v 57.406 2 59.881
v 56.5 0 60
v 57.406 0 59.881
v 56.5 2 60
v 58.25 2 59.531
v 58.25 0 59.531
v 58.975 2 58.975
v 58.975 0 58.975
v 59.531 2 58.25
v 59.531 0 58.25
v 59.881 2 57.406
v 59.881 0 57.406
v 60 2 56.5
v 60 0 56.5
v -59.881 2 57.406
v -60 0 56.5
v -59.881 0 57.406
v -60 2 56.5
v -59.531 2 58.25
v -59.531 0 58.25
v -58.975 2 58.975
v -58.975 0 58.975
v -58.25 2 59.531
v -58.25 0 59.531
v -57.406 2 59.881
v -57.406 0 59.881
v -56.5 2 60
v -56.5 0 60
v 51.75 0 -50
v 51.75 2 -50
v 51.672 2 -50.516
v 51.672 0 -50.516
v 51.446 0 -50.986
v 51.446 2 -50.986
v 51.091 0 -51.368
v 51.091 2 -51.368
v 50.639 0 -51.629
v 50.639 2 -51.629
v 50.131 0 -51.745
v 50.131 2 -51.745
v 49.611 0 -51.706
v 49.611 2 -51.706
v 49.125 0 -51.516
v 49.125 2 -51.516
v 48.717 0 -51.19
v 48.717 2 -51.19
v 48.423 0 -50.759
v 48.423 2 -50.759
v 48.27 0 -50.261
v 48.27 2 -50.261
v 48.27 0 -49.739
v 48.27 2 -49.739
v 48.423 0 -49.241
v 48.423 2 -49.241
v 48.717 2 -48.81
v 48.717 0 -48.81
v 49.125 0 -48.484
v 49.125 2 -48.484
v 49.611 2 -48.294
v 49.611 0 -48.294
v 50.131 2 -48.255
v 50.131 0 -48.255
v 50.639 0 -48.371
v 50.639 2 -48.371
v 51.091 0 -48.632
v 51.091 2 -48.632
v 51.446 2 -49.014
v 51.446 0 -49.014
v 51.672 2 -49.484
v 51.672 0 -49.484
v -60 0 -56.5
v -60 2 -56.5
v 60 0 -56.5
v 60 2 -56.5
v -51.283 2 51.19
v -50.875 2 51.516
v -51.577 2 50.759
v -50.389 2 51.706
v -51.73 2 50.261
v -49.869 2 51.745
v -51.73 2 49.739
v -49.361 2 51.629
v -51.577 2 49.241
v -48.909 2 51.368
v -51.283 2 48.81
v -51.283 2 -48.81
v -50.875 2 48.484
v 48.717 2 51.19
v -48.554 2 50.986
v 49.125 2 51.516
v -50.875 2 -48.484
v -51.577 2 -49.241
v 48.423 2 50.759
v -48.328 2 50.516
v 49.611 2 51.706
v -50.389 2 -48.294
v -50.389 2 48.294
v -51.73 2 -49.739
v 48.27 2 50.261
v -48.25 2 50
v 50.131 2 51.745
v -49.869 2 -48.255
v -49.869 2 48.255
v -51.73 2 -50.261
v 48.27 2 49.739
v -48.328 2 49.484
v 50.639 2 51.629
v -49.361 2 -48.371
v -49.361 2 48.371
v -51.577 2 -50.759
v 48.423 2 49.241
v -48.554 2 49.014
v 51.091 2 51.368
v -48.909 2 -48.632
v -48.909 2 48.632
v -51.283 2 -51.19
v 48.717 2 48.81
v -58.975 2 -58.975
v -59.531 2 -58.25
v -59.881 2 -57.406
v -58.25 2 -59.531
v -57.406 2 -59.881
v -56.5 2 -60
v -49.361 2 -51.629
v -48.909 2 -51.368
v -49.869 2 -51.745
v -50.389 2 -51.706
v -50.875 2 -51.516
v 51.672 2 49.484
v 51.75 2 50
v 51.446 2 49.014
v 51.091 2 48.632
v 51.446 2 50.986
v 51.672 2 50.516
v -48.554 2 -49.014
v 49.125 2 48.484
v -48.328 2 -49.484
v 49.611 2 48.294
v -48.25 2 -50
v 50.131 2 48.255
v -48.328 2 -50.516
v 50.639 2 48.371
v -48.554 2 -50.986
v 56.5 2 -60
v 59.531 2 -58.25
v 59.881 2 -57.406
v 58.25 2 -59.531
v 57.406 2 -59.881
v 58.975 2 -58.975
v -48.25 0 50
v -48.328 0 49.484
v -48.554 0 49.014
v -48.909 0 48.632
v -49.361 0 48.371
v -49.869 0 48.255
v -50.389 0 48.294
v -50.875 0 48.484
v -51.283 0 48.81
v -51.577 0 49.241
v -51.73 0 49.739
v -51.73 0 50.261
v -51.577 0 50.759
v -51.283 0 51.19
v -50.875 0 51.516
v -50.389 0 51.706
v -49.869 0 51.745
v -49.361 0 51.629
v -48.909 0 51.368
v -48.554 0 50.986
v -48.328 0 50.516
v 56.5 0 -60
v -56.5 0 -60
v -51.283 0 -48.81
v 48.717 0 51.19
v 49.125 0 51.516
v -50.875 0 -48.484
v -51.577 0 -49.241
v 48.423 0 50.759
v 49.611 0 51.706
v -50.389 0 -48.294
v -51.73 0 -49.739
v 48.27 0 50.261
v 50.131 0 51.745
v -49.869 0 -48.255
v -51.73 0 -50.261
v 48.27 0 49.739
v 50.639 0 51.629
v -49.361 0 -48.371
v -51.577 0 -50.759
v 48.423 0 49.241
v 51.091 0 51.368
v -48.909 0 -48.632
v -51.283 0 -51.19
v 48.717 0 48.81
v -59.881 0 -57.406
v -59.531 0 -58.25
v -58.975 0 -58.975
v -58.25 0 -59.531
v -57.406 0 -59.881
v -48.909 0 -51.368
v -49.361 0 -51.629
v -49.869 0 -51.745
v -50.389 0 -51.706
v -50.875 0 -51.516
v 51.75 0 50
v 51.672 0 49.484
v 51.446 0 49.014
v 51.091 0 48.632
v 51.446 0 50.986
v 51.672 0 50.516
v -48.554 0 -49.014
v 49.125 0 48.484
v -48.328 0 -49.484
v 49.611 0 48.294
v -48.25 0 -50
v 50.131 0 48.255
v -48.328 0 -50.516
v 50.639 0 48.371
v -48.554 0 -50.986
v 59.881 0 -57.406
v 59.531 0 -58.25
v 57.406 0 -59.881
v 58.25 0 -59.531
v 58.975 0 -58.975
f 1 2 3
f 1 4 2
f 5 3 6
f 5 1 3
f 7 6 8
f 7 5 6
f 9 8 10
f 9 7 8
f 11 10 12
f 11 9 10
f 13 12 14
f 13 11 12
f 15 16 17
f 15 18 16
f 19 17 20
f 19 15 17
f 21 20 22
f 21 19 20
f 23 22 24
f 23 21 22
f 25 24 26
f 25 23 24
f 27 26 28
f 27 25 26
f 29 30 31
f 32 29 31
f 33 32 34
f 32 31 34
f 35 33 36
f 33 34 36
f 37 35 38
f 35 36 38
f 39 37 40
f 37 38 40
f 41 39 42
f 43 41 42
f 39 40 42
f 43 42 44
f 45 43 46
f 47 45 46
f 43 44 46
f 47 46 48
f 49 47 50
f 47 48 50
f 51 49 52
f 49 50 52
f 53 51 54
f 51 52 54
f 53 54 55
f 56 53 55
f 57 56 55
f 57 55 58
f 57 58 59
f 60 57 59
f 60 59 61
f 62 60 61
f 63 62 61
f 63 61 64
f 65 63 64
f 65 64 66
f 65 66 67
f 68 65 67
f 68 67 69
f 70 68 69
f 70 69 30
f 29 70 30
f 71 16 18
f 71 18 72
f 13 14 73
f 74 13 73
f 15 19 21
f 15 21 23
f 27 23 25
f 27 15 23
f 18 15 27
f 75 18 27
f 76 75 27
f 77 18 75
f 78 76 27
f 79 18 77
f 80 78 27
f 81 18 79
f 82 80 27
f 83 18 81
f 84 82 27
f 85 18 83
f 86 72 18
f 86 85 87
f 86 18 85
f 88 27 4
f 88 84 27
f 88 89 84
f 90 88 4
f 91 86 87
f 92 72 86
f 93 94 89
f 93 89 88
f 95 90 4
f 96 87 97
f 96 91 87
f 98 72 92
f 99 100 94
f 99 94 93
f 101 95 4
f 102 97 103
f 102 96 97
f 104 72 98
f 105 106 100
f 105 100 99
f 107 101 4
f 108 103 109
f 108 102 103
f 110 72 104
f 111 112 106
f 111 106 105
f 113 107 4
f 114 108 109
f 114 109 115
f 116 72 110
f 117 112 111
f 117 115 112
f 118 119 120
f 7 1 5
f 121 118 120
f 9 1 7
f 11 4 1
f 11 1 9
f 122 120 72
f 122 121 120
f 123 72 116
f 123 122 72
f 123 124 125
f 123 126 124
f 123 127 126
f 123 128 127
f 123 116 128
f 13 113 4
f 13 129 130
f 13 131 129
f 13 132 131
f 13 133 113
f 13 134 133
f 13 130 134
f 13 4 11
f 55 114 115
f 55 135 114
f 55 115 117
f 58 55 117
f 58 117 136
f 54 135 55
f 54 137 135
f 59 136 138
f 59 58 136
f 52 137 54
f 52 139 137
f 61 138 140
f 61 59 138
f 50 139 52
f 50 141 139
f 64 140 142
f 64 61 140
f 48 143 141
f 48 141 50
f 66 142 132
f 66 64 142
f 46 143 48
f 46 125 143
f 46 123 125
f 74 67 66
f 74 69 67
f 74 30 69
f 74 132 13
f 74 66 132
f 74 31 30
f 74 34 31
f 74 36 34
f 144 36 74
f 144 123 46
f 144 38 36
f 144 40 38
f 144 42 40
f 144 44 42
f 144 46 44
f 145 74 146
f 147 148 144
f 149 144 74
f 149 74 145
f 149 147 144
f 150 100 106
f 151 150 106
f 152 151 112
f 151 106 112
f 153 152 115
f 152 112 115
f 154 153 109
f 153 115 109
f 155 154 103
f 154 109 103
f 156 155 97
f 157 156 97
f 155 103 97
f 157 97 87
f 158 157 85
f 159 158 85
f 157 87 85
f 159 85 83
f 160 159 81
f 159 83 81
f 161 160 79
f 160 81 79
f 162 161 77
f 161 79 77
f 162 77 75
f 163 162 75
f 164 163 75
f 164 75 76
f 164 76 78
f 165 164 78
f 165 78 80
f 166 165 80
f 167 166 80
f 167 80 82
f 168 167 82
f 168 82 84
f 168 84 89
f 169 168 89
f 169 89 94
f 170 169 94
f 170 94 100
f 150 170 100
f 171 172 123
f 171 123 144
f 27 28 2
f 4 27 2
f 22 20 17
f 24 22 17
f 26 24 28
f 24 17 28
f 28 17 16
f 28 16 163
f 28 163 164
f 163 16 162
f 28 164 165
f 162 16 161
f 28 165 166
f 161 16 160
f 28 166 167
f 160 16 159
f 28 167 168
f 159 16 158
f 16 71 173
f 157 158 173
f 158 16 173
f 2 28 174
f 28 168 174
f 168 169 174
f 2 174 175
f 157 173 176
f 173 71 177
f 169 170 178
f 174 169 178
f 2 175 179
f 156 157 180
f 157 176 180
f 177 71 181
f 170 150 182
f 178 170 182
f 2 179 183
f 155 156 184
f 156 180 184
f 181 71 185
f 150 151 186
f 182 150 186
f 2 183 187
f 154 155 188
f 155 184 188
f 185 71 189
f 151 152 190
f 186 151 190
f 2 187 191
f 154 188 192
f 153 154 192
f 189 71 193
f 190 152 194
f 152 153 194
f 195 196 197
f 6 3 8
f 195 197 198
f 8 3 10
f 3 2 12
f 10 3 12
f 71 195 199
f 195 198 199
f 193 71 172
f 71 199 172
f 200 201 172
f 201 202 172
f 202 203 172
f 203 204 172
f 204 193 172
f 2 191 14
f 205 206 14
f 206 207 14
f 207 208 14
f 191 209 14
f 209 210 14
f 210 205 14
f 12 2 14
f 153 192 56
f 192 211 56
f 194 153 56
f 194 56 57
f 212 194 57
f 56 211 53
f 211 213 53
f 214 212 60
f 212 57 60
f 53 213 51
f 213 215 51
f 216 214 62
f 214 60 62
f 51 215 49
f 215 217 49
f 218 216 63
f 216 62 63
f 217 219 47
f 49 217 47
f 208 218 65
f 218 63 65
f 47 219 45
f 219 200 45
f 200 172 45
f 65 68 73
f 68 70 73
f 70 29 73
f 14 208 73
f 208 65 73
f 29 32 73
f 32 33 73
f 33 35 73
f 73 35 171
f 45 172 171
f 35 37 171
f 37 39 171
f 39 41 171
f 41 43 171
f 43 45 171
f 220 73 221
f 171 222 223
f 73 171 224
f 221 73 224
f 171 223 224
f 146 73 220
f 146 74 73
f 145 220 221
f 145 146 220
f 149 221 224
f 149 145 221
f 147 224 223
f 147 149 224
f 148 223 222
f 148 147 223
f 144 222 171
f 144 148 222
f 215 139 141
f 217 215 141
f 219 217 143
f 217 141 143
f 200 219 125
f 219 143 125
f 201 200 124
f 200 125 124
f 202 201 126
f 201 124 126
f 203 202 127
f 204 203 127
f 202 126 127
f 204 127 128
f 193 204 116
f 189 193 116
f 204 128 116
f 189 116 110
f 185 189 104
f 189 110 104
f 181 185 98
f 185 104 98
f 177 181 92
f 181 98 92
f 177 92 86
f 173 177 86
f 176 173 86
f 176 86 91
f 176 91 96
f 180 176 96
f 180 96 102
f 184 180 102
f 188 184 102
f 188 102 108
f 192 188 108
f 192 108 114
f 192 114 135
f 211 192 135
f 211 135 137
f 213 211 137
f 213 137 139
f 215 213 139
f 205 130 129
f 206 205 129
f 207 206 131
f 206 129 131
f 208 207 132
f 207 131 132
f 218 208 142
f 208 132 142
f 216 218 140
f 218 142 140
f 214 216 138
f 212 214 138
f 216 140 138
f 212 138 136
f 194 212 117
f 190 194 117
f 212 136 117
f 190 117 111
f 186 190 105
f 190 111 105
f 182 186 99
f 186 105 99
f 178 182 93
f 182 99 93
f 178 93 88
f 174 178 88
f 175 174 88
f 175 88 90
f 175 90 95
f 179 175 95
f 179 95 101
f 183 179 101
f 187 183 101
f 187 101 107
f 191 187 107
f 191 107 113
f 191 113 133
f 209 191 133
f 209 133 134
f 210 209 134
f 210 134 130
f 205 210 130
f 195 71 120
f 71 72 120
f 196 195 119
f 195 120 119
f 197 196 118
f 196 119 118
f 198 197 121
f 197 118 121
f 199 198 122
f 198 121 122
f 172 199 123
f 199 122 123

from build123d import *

# Parameters (mm, degrees)
SKETCH_4_W          = 120
SKETCH_4_H          = 120
EXTRUDE_2_DEPTH     = 2
FILLET_2_R          = 3.5
SKETCH_5_R          = 1.75
CUT_EXTRUDE_1_DEPTH = 3


with BuildPart() as part:
    # 草图4 → 凸台-拉伸2 (new body)
    with BuildSketch(Plane(origin=(0, 0, 0), x_dir=(1, 0, 0), z_dir=(0, 1, 0))):
        Rectangle(SKETCH_4_W, SKETCH_4_H)
    extrude(amount=EXTRUDE_2_DEPTH)

    # 圆角2
    fillet_2_edges = [part.edges().sort_by_distance(p)[0] for p in [
        (60, 1, 60),
        (-60, 1, 60),
        (-60, 1, -60),
        (60, 1, -60),
    ]]
    fillet(fillet_2_edges, radius=FILLET_2_R)

    # 草图5 → 切除-拉伸1 (cut, through all)
    with BuildSketch(Plane(origin=(0, 2, 0), x_dir=(1, 0, 0), z_dir=(0, 1, 0))):
        with Locations((-50, 50)):
            Circle(SKETCH_5_R)
        with Locations((-50, -50)):
            Circle(SKETCH_5_R)
        with Locations((50, -50)):
            Circle(SKETCH_5_R)
        with Locations((50, 50)):
            Circle(SKETCH_5_R)
    extrude(amount=-CUT_EXTRUDE_1_DEPTH, mode=Mode.SUBTRACT)


solid = part.part
